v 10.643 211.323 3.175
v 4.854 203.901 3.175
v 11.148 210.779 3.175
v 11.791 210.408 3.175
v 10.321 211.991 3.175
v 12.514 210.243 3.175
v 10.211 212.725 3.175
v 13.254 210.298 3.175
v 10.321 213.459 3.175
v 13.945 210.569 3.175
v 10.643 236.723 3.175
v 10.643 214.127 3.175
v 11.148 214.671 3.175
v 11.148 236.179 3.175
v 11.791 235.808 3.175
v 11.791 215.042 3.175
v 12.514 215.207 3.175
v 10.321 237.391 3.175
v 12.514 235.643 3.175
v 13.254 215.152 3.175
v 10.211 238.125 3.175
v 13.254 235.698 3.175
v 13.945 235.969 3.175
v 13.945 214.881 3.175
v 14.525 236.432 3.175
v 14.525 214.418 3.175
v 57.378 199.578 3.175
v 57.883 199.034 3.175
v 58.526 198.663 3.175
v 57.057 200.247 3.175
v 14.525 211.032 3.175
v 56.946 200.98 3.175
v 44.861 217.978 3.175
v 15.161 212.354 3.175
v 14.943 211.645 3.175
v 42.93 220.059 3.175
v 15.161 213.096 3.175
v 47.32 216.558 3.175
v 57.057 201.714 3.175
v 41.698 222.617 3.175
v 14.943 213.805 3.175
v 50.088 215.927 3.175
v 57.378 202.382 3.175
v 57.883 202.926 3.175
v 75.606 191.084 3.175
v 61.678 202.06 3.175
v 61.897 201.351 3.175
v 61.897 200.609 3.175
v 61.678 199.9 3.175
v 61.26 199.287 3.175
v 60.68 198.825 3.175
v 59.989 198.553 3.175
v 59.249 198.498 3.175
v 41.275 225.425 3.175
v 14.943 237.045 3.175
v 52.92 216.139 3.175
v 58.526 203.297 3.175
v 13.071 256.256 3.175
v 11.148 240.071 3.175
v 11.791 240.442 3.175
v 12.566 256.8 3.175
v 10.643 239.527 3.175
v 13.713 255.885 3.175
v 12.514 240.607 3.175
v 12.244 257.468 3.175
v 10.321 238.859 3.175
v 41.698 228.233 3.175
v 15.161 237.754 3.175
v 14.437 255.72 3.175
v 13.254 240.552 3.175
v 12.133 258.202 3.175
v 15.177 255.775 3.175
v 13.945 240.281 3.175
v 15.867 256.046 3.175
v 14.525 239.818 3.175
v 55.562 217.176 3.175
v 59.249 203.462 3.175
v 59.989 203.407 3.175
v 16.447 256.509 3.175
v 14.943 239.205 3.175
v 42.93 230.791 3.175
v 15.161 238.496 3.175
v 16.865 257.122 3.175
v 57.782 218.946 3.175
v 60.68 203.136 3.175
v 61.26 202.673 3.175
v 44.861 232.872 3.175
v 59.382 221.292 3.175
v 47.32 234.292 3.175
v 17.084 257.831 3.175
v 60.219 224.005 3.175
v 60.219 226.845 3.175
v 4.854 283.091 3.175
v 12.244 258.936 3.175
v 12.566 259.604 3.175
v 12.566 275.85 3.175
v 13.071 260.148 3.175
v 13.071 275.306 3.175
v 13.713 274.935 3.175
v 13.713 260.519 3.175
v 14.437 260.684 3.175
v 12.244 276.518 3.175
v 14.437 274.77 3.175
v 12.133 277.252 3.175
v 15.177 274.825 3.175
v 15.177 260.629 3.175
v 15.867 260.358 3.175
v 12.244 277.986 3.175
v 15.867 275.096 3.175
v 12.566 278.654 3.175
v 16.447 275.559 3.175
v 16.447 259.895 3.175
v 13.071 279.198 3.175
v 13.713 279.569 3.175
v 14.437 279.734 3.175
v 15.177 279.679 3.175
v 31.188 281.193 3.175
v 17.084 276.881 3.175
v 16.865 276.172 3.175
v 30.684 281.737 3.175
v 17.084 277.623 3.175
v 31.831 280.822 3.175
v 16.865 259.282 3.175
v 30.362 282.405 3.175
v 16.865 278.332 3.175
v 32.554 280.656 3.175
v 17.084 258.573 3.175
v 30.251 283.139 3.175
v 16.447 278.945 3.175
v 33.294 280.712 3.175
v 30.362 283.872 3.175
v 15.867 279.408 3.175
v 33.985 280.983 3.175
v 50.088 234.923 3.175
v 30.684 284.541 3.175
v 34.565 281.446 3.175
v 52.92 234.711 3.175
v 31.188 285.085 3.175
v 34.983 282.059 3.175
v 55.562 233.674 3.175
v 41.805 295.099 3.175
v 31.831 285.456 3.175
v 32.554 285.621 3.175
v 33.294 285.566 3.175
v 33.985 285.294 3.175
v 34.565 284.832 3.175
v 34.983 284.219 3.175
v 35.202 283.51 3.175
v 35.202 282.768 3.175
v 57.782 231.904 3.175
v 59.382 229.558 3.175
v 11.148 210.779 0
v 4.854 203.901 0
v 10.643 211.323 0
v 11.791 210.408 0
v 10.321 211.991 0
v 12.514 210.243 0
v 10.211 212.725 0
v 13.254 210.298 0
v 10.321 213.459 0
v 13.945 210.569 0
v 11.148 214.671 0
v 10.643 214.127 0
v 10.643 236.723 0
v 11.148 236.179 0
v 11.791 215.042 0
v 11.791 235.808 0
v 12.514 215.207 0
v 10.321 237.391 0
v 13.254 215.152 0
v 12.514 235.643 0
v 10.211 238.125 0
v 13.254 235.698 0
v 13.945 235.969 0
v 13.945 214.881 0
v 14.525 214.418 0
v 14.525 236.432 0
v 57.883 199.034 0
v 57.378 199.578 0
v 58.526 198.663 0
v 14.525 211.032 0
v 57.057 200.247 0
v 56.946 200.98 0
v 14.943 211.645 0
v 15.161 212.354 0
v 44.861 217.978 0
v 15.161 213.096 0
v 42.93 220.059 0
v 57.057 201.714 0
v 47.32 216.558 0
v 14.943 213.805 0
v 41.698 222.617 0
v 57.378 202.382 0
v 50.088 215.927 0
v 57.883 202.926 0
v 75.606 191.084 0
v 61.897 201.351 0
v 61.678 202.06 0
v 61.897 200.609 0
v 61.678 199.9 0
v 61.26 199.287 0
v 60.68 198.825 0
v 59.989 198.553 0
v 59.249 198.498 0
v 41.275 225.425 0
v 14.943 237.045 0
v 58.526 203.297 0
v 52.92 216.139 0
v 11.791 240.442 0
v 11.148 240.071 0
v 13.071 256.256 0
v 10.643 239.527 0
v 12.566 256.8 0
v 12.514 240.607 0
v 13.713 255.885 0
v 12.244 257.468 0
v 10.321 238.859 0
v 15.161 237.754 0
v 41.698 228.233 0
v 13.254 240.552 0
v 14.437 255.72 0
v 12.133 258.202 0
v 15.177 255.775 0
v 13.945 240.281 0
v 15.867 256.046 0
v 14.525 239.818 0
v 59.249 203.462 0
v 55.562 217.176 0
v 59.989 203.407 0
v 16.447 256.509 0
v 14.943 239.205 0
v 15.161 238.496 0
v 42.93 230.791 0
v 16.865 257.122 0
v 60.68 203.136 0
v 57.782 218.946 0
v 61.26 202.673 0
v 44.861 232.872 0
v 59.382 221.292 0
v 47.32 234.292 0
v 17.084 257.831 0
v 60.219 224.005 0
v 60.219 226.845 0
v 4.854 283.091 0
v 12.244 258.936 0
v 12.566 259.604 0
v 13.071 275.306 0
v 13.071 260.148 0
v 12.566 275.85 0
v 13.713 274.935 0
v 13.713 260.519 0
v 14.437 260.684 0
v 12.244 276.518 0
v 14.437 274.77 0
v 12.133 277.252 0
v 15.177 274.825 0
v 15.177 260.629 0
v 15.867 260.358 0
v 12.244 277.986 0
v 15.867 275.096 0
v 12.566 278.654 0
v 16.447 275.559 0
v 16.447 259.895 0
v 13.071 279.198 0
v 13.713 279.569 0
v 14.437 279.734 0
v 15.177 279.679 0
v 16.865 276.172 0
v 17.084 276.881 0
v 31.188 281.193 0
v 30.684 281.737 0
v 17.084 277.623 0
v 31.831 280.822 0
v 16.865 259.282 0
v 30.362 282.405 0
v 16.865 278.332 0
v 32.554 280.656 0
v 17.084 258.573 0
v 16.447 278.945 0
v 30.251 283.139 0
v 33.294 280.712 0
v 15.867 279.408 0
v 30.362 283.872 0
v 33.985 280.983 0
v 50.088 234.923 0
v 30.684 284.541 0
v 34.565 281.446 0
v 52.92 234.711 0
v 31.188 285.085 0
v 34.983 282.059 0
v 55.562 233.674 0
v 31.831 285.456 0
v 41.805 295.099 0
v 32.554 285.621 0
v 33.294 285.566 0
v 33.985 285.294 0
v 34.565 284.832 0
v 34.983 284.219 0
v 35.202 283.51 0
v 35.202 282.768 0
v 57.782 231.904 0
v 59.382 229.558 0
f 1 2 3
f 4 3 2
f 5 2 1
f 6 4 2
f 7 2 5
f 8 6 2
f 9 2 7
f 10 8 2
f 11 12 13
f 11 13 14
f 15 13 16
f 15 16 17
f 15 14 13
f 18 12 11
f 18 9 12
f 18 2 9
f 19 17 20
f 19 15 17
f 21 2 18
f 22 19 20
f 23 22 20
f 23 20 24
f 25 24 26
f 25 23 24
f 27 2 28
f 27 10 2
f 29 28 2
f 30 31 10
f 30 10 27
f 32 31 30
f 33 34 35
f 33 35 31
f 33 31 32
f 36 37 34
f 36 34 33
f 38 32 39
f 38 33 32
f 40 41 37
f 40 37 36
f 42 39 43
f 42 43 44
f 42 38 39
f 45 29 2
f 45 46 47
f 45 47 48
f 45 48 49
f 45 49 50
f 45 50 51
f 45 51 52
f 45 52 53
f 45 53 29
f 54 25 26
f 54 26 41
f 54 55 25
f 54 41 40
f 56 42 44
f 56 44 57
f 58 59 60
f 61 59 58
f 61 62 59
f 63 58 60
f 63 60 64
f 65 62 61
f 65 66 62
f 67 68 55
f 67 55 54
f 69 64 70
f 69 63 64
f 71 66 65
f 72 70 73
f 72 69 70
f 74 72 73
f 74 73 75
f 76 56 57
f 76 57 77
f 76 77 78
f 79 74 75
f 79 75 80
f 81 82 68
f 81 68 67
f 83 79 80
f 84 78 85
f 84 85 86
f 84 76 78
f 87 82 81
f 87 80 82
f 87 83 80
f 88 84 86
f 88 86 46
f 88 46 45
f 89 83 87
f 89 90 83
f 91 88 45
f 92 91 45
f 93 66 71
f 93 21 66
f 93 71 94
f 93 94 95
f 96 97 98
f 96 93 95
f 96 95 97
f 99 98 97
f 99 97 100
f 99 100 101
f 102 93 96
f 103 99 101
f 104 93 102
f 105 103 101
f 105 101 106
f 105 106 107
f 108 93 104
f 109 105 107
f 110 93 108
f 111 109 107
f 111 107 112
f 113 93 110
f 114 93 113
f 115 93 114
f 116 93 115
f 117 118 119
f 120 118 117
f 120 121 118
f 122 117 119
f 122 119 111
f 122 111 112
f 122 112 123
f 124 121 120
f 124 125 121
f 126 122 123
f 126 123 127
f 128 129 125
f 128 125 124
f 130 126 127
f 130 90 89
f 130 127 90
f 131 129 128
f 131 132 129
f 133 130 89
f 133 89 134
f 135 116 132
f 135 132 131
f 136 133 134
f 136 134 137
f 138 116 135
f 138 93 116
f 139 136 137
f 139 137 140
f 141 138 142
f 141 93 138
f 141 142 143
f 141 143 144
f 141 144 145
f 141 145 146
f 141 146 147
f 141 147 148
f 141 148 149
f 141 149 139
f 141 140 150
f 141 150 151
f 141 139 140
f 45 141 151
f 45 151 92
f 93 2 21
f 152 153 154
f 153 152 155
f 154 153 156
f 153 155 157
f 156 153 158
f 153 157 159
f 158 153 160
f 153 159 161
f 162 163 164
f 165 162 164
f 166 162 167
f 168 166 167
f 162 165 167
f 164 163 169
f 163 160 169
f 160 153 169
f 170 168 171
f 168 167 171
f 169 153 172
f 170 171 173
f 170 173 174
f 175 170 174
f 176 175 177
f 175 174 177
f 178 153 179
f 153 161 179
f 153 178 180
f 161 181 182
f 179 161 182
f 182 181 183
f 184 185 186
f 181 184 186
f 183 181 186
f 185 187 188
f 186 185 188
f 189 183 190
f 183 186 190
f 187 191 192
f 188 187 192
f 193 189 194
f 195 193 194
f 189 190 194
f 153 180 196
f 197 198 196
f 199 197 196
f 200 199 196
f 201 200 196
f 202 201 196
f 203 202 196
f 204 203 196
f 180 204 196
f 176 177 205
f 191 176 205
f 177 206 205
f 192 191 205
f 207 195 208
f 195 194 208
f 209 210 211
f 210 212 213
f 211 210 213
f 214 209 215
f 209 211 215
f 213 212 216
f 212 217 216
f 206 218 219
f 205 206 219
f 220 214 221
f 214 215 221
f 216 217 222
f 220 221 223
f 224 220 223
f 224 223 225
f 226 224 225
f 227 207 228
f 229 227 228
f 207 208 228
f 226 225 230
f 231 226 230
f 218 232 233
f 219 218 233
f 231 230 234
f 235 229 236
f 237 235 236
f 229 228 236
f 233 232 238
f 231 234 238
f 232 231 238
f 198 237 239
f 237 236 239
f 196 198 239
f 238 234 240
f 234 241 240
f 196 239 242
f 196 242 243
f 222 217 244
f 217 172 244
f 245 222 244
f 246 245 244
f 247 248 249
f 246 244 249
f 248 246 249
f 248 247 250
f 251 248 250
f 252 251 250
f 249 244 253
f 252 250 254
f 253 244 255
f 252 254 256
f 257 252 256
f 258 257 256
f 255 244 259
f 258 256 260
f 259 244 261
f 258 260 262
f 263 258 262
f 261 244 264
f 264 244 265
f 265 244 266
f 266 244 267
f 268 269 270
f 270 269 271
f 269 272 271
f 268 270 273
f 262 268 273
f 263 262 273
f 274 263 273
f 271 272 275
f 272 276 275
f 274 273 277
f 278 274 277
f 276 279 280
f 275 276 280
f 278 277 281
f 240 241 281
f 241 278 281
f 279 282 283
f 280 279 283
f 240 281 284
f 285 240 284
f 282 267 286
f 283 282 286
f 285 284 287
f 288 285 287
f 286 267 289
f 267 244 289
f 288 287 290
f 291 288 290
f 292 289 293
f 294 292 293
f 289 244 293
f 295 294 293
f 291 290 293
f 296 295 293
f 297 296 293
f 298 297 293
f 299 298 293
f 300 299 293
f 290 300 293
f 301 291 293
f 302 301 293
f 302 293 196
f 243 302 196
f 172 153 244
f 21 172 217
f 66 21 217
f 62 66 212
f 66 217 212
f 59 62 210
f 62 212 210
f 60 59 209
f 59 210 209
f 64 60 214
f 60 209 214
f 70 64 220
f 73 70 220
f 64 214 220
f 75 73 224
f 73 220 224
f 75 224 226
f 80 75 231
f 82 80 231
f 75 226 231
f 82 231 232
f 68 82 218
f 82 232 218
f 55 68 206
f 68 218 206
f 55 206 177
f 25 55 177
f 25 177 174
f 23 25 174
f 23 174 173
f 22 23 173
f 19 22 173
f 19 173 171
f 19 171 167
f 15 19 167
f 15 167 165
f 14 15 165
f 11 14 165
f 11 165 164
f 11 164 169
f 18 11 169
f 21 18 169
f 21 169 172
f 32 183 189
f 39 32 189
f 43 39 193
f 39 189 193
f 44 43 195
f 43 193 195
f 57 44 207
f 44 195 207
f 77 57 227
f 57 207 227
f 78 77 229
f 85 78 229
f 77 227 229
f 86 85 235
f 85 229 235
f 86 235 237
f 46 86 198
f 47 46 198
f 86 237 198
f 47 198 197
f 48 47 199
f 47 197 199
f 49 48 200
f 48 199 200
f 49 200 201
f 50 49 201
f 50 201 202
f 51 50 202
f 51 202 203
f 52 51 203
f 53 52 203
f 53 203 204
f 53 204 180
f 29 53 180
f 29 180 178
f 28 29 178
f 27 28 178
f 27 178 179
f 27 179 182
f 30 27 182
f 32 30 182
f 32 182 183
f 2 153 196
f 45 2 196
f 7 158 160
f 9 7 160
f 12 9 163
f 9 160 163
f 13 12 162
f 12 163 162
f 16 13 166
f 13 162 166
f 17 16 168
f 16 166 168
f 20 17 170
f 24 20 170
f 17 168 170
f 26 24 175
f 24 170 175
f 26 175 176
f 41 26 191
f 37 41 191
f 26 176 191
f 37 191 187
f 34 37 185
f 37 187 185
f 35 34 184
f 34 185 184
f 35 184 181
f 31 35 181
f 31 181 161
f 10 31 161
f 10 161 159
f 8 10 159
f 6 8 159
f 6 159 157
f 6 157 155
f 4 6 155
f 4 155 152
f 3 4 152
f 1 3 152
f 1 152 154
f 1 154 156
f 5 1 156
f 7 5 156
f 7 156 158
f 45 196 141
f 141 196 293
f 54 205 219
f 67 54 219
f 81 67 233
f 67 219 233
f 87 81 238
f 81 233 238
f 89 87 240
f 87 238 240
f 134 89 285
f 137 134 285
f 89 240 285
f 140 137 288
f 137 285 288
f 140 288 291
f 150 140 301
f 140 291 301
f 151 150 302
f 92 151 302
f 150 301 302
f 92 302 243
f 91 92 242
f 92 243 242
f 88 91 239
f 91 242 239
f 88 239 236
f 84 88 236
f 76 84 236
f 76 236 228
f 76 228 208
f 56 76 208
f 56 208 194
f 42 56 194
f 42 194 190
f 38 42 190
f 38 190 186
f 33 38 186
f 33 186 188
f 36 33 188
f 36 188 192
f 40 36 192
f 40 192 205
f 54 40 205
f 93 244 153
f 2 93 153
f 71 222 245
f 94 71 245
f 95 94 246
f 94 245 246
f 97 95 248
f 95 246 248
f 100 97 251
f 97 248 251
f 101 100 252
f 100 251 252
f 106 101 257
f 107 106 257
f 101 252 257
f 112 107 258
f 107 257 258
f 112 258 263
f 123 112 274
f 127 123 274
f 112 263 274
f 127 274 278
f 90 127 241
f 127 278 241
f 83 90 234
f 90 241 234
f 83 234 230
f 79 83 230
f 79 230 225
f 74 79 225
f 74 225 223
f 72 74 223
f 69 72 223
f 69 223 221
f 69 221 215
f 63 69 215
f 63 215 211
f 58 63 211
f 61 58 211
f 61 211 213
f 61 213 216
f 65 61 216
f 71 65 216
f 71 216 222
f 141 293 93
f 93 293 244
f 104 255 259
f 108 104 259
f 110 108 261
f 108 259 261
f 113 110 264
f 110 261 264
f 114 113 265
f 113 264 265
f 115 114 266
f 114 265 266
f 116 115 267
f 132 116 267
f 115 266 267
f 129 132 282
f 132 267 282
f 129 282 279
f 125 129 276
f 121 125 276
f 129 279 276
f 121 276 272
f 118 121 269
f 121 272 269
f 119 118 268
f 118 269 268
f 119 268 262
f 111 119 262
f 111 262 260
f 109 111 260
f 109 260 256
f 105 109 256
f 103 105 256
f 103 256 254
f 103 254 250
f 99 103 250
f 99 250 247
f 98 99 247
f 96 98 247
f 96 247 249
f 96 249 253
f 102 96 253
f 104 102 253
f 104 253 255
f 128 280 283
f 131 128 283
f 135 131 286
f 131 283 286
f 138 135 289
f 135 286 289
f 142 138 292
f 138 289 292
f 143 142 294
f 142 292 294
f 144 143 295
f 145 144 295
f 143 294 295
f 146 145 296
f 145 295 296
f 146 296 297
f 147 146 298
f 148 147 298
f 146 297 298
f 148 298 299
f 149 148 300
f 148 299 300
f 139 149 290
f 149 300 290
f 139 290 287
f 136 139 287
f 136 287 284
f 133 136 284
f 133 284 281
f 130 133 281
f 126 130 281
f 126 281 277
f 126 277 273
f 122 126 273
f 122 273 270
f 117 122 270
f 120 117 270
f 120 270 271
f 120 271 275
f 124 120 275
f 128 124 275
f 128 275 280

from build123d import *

# Parameters (mm, degrees)
BOSS_EXTRUDE1_DEPTH    = 3.175
F_10_CLEARANCE_HOLE1_D = 4.9784
SKETCH8_R              = 9.525
CUT_EXTRUDE1_DEPTH     = 305.646421585


with BuildPart() as part:
    # Sketch2 → Boss-Extrude1 (new body)
    with BuildSketch(Plane.XY):
        Polygon((75.605515224, 191.084223429), (41.804664545, 295.09857273), (4.854209552, 283.091029346), (4.854209552, 203.901454104), align=None)
    extrude(amount=BOSS_EXTRUDE1_DEPTH)

    # #10 Clearance Hole1 (through all)
    with Locations(Plane.XY.offset(3.175)):
        with Locations((32.740251946, 283.138719963), (59.435154755, 200.980257064), (12.7, 238.125), (12.7, 212.725), (14.622625311, 277.25194622), (14.622625311, 258.20194622)):
            Hole(F_10_CLEARANCE_HOLE1_D / 2)

    # Sketch8 → Cut-Extrude1 (cut, through all)
    with BuildSketch(Plane(origin=(0, 0, 0), x_dir=(-1, 0, 0), z_dir=(0, 0, -1))):
        with Locations((-50.8, 225.425)):
            Circle(SKETCH8_R)
    extrude(amount=-CUT_EXTRUDE1_DEPTH, mode=Mode.SUBTRACT)


solid = part.part
